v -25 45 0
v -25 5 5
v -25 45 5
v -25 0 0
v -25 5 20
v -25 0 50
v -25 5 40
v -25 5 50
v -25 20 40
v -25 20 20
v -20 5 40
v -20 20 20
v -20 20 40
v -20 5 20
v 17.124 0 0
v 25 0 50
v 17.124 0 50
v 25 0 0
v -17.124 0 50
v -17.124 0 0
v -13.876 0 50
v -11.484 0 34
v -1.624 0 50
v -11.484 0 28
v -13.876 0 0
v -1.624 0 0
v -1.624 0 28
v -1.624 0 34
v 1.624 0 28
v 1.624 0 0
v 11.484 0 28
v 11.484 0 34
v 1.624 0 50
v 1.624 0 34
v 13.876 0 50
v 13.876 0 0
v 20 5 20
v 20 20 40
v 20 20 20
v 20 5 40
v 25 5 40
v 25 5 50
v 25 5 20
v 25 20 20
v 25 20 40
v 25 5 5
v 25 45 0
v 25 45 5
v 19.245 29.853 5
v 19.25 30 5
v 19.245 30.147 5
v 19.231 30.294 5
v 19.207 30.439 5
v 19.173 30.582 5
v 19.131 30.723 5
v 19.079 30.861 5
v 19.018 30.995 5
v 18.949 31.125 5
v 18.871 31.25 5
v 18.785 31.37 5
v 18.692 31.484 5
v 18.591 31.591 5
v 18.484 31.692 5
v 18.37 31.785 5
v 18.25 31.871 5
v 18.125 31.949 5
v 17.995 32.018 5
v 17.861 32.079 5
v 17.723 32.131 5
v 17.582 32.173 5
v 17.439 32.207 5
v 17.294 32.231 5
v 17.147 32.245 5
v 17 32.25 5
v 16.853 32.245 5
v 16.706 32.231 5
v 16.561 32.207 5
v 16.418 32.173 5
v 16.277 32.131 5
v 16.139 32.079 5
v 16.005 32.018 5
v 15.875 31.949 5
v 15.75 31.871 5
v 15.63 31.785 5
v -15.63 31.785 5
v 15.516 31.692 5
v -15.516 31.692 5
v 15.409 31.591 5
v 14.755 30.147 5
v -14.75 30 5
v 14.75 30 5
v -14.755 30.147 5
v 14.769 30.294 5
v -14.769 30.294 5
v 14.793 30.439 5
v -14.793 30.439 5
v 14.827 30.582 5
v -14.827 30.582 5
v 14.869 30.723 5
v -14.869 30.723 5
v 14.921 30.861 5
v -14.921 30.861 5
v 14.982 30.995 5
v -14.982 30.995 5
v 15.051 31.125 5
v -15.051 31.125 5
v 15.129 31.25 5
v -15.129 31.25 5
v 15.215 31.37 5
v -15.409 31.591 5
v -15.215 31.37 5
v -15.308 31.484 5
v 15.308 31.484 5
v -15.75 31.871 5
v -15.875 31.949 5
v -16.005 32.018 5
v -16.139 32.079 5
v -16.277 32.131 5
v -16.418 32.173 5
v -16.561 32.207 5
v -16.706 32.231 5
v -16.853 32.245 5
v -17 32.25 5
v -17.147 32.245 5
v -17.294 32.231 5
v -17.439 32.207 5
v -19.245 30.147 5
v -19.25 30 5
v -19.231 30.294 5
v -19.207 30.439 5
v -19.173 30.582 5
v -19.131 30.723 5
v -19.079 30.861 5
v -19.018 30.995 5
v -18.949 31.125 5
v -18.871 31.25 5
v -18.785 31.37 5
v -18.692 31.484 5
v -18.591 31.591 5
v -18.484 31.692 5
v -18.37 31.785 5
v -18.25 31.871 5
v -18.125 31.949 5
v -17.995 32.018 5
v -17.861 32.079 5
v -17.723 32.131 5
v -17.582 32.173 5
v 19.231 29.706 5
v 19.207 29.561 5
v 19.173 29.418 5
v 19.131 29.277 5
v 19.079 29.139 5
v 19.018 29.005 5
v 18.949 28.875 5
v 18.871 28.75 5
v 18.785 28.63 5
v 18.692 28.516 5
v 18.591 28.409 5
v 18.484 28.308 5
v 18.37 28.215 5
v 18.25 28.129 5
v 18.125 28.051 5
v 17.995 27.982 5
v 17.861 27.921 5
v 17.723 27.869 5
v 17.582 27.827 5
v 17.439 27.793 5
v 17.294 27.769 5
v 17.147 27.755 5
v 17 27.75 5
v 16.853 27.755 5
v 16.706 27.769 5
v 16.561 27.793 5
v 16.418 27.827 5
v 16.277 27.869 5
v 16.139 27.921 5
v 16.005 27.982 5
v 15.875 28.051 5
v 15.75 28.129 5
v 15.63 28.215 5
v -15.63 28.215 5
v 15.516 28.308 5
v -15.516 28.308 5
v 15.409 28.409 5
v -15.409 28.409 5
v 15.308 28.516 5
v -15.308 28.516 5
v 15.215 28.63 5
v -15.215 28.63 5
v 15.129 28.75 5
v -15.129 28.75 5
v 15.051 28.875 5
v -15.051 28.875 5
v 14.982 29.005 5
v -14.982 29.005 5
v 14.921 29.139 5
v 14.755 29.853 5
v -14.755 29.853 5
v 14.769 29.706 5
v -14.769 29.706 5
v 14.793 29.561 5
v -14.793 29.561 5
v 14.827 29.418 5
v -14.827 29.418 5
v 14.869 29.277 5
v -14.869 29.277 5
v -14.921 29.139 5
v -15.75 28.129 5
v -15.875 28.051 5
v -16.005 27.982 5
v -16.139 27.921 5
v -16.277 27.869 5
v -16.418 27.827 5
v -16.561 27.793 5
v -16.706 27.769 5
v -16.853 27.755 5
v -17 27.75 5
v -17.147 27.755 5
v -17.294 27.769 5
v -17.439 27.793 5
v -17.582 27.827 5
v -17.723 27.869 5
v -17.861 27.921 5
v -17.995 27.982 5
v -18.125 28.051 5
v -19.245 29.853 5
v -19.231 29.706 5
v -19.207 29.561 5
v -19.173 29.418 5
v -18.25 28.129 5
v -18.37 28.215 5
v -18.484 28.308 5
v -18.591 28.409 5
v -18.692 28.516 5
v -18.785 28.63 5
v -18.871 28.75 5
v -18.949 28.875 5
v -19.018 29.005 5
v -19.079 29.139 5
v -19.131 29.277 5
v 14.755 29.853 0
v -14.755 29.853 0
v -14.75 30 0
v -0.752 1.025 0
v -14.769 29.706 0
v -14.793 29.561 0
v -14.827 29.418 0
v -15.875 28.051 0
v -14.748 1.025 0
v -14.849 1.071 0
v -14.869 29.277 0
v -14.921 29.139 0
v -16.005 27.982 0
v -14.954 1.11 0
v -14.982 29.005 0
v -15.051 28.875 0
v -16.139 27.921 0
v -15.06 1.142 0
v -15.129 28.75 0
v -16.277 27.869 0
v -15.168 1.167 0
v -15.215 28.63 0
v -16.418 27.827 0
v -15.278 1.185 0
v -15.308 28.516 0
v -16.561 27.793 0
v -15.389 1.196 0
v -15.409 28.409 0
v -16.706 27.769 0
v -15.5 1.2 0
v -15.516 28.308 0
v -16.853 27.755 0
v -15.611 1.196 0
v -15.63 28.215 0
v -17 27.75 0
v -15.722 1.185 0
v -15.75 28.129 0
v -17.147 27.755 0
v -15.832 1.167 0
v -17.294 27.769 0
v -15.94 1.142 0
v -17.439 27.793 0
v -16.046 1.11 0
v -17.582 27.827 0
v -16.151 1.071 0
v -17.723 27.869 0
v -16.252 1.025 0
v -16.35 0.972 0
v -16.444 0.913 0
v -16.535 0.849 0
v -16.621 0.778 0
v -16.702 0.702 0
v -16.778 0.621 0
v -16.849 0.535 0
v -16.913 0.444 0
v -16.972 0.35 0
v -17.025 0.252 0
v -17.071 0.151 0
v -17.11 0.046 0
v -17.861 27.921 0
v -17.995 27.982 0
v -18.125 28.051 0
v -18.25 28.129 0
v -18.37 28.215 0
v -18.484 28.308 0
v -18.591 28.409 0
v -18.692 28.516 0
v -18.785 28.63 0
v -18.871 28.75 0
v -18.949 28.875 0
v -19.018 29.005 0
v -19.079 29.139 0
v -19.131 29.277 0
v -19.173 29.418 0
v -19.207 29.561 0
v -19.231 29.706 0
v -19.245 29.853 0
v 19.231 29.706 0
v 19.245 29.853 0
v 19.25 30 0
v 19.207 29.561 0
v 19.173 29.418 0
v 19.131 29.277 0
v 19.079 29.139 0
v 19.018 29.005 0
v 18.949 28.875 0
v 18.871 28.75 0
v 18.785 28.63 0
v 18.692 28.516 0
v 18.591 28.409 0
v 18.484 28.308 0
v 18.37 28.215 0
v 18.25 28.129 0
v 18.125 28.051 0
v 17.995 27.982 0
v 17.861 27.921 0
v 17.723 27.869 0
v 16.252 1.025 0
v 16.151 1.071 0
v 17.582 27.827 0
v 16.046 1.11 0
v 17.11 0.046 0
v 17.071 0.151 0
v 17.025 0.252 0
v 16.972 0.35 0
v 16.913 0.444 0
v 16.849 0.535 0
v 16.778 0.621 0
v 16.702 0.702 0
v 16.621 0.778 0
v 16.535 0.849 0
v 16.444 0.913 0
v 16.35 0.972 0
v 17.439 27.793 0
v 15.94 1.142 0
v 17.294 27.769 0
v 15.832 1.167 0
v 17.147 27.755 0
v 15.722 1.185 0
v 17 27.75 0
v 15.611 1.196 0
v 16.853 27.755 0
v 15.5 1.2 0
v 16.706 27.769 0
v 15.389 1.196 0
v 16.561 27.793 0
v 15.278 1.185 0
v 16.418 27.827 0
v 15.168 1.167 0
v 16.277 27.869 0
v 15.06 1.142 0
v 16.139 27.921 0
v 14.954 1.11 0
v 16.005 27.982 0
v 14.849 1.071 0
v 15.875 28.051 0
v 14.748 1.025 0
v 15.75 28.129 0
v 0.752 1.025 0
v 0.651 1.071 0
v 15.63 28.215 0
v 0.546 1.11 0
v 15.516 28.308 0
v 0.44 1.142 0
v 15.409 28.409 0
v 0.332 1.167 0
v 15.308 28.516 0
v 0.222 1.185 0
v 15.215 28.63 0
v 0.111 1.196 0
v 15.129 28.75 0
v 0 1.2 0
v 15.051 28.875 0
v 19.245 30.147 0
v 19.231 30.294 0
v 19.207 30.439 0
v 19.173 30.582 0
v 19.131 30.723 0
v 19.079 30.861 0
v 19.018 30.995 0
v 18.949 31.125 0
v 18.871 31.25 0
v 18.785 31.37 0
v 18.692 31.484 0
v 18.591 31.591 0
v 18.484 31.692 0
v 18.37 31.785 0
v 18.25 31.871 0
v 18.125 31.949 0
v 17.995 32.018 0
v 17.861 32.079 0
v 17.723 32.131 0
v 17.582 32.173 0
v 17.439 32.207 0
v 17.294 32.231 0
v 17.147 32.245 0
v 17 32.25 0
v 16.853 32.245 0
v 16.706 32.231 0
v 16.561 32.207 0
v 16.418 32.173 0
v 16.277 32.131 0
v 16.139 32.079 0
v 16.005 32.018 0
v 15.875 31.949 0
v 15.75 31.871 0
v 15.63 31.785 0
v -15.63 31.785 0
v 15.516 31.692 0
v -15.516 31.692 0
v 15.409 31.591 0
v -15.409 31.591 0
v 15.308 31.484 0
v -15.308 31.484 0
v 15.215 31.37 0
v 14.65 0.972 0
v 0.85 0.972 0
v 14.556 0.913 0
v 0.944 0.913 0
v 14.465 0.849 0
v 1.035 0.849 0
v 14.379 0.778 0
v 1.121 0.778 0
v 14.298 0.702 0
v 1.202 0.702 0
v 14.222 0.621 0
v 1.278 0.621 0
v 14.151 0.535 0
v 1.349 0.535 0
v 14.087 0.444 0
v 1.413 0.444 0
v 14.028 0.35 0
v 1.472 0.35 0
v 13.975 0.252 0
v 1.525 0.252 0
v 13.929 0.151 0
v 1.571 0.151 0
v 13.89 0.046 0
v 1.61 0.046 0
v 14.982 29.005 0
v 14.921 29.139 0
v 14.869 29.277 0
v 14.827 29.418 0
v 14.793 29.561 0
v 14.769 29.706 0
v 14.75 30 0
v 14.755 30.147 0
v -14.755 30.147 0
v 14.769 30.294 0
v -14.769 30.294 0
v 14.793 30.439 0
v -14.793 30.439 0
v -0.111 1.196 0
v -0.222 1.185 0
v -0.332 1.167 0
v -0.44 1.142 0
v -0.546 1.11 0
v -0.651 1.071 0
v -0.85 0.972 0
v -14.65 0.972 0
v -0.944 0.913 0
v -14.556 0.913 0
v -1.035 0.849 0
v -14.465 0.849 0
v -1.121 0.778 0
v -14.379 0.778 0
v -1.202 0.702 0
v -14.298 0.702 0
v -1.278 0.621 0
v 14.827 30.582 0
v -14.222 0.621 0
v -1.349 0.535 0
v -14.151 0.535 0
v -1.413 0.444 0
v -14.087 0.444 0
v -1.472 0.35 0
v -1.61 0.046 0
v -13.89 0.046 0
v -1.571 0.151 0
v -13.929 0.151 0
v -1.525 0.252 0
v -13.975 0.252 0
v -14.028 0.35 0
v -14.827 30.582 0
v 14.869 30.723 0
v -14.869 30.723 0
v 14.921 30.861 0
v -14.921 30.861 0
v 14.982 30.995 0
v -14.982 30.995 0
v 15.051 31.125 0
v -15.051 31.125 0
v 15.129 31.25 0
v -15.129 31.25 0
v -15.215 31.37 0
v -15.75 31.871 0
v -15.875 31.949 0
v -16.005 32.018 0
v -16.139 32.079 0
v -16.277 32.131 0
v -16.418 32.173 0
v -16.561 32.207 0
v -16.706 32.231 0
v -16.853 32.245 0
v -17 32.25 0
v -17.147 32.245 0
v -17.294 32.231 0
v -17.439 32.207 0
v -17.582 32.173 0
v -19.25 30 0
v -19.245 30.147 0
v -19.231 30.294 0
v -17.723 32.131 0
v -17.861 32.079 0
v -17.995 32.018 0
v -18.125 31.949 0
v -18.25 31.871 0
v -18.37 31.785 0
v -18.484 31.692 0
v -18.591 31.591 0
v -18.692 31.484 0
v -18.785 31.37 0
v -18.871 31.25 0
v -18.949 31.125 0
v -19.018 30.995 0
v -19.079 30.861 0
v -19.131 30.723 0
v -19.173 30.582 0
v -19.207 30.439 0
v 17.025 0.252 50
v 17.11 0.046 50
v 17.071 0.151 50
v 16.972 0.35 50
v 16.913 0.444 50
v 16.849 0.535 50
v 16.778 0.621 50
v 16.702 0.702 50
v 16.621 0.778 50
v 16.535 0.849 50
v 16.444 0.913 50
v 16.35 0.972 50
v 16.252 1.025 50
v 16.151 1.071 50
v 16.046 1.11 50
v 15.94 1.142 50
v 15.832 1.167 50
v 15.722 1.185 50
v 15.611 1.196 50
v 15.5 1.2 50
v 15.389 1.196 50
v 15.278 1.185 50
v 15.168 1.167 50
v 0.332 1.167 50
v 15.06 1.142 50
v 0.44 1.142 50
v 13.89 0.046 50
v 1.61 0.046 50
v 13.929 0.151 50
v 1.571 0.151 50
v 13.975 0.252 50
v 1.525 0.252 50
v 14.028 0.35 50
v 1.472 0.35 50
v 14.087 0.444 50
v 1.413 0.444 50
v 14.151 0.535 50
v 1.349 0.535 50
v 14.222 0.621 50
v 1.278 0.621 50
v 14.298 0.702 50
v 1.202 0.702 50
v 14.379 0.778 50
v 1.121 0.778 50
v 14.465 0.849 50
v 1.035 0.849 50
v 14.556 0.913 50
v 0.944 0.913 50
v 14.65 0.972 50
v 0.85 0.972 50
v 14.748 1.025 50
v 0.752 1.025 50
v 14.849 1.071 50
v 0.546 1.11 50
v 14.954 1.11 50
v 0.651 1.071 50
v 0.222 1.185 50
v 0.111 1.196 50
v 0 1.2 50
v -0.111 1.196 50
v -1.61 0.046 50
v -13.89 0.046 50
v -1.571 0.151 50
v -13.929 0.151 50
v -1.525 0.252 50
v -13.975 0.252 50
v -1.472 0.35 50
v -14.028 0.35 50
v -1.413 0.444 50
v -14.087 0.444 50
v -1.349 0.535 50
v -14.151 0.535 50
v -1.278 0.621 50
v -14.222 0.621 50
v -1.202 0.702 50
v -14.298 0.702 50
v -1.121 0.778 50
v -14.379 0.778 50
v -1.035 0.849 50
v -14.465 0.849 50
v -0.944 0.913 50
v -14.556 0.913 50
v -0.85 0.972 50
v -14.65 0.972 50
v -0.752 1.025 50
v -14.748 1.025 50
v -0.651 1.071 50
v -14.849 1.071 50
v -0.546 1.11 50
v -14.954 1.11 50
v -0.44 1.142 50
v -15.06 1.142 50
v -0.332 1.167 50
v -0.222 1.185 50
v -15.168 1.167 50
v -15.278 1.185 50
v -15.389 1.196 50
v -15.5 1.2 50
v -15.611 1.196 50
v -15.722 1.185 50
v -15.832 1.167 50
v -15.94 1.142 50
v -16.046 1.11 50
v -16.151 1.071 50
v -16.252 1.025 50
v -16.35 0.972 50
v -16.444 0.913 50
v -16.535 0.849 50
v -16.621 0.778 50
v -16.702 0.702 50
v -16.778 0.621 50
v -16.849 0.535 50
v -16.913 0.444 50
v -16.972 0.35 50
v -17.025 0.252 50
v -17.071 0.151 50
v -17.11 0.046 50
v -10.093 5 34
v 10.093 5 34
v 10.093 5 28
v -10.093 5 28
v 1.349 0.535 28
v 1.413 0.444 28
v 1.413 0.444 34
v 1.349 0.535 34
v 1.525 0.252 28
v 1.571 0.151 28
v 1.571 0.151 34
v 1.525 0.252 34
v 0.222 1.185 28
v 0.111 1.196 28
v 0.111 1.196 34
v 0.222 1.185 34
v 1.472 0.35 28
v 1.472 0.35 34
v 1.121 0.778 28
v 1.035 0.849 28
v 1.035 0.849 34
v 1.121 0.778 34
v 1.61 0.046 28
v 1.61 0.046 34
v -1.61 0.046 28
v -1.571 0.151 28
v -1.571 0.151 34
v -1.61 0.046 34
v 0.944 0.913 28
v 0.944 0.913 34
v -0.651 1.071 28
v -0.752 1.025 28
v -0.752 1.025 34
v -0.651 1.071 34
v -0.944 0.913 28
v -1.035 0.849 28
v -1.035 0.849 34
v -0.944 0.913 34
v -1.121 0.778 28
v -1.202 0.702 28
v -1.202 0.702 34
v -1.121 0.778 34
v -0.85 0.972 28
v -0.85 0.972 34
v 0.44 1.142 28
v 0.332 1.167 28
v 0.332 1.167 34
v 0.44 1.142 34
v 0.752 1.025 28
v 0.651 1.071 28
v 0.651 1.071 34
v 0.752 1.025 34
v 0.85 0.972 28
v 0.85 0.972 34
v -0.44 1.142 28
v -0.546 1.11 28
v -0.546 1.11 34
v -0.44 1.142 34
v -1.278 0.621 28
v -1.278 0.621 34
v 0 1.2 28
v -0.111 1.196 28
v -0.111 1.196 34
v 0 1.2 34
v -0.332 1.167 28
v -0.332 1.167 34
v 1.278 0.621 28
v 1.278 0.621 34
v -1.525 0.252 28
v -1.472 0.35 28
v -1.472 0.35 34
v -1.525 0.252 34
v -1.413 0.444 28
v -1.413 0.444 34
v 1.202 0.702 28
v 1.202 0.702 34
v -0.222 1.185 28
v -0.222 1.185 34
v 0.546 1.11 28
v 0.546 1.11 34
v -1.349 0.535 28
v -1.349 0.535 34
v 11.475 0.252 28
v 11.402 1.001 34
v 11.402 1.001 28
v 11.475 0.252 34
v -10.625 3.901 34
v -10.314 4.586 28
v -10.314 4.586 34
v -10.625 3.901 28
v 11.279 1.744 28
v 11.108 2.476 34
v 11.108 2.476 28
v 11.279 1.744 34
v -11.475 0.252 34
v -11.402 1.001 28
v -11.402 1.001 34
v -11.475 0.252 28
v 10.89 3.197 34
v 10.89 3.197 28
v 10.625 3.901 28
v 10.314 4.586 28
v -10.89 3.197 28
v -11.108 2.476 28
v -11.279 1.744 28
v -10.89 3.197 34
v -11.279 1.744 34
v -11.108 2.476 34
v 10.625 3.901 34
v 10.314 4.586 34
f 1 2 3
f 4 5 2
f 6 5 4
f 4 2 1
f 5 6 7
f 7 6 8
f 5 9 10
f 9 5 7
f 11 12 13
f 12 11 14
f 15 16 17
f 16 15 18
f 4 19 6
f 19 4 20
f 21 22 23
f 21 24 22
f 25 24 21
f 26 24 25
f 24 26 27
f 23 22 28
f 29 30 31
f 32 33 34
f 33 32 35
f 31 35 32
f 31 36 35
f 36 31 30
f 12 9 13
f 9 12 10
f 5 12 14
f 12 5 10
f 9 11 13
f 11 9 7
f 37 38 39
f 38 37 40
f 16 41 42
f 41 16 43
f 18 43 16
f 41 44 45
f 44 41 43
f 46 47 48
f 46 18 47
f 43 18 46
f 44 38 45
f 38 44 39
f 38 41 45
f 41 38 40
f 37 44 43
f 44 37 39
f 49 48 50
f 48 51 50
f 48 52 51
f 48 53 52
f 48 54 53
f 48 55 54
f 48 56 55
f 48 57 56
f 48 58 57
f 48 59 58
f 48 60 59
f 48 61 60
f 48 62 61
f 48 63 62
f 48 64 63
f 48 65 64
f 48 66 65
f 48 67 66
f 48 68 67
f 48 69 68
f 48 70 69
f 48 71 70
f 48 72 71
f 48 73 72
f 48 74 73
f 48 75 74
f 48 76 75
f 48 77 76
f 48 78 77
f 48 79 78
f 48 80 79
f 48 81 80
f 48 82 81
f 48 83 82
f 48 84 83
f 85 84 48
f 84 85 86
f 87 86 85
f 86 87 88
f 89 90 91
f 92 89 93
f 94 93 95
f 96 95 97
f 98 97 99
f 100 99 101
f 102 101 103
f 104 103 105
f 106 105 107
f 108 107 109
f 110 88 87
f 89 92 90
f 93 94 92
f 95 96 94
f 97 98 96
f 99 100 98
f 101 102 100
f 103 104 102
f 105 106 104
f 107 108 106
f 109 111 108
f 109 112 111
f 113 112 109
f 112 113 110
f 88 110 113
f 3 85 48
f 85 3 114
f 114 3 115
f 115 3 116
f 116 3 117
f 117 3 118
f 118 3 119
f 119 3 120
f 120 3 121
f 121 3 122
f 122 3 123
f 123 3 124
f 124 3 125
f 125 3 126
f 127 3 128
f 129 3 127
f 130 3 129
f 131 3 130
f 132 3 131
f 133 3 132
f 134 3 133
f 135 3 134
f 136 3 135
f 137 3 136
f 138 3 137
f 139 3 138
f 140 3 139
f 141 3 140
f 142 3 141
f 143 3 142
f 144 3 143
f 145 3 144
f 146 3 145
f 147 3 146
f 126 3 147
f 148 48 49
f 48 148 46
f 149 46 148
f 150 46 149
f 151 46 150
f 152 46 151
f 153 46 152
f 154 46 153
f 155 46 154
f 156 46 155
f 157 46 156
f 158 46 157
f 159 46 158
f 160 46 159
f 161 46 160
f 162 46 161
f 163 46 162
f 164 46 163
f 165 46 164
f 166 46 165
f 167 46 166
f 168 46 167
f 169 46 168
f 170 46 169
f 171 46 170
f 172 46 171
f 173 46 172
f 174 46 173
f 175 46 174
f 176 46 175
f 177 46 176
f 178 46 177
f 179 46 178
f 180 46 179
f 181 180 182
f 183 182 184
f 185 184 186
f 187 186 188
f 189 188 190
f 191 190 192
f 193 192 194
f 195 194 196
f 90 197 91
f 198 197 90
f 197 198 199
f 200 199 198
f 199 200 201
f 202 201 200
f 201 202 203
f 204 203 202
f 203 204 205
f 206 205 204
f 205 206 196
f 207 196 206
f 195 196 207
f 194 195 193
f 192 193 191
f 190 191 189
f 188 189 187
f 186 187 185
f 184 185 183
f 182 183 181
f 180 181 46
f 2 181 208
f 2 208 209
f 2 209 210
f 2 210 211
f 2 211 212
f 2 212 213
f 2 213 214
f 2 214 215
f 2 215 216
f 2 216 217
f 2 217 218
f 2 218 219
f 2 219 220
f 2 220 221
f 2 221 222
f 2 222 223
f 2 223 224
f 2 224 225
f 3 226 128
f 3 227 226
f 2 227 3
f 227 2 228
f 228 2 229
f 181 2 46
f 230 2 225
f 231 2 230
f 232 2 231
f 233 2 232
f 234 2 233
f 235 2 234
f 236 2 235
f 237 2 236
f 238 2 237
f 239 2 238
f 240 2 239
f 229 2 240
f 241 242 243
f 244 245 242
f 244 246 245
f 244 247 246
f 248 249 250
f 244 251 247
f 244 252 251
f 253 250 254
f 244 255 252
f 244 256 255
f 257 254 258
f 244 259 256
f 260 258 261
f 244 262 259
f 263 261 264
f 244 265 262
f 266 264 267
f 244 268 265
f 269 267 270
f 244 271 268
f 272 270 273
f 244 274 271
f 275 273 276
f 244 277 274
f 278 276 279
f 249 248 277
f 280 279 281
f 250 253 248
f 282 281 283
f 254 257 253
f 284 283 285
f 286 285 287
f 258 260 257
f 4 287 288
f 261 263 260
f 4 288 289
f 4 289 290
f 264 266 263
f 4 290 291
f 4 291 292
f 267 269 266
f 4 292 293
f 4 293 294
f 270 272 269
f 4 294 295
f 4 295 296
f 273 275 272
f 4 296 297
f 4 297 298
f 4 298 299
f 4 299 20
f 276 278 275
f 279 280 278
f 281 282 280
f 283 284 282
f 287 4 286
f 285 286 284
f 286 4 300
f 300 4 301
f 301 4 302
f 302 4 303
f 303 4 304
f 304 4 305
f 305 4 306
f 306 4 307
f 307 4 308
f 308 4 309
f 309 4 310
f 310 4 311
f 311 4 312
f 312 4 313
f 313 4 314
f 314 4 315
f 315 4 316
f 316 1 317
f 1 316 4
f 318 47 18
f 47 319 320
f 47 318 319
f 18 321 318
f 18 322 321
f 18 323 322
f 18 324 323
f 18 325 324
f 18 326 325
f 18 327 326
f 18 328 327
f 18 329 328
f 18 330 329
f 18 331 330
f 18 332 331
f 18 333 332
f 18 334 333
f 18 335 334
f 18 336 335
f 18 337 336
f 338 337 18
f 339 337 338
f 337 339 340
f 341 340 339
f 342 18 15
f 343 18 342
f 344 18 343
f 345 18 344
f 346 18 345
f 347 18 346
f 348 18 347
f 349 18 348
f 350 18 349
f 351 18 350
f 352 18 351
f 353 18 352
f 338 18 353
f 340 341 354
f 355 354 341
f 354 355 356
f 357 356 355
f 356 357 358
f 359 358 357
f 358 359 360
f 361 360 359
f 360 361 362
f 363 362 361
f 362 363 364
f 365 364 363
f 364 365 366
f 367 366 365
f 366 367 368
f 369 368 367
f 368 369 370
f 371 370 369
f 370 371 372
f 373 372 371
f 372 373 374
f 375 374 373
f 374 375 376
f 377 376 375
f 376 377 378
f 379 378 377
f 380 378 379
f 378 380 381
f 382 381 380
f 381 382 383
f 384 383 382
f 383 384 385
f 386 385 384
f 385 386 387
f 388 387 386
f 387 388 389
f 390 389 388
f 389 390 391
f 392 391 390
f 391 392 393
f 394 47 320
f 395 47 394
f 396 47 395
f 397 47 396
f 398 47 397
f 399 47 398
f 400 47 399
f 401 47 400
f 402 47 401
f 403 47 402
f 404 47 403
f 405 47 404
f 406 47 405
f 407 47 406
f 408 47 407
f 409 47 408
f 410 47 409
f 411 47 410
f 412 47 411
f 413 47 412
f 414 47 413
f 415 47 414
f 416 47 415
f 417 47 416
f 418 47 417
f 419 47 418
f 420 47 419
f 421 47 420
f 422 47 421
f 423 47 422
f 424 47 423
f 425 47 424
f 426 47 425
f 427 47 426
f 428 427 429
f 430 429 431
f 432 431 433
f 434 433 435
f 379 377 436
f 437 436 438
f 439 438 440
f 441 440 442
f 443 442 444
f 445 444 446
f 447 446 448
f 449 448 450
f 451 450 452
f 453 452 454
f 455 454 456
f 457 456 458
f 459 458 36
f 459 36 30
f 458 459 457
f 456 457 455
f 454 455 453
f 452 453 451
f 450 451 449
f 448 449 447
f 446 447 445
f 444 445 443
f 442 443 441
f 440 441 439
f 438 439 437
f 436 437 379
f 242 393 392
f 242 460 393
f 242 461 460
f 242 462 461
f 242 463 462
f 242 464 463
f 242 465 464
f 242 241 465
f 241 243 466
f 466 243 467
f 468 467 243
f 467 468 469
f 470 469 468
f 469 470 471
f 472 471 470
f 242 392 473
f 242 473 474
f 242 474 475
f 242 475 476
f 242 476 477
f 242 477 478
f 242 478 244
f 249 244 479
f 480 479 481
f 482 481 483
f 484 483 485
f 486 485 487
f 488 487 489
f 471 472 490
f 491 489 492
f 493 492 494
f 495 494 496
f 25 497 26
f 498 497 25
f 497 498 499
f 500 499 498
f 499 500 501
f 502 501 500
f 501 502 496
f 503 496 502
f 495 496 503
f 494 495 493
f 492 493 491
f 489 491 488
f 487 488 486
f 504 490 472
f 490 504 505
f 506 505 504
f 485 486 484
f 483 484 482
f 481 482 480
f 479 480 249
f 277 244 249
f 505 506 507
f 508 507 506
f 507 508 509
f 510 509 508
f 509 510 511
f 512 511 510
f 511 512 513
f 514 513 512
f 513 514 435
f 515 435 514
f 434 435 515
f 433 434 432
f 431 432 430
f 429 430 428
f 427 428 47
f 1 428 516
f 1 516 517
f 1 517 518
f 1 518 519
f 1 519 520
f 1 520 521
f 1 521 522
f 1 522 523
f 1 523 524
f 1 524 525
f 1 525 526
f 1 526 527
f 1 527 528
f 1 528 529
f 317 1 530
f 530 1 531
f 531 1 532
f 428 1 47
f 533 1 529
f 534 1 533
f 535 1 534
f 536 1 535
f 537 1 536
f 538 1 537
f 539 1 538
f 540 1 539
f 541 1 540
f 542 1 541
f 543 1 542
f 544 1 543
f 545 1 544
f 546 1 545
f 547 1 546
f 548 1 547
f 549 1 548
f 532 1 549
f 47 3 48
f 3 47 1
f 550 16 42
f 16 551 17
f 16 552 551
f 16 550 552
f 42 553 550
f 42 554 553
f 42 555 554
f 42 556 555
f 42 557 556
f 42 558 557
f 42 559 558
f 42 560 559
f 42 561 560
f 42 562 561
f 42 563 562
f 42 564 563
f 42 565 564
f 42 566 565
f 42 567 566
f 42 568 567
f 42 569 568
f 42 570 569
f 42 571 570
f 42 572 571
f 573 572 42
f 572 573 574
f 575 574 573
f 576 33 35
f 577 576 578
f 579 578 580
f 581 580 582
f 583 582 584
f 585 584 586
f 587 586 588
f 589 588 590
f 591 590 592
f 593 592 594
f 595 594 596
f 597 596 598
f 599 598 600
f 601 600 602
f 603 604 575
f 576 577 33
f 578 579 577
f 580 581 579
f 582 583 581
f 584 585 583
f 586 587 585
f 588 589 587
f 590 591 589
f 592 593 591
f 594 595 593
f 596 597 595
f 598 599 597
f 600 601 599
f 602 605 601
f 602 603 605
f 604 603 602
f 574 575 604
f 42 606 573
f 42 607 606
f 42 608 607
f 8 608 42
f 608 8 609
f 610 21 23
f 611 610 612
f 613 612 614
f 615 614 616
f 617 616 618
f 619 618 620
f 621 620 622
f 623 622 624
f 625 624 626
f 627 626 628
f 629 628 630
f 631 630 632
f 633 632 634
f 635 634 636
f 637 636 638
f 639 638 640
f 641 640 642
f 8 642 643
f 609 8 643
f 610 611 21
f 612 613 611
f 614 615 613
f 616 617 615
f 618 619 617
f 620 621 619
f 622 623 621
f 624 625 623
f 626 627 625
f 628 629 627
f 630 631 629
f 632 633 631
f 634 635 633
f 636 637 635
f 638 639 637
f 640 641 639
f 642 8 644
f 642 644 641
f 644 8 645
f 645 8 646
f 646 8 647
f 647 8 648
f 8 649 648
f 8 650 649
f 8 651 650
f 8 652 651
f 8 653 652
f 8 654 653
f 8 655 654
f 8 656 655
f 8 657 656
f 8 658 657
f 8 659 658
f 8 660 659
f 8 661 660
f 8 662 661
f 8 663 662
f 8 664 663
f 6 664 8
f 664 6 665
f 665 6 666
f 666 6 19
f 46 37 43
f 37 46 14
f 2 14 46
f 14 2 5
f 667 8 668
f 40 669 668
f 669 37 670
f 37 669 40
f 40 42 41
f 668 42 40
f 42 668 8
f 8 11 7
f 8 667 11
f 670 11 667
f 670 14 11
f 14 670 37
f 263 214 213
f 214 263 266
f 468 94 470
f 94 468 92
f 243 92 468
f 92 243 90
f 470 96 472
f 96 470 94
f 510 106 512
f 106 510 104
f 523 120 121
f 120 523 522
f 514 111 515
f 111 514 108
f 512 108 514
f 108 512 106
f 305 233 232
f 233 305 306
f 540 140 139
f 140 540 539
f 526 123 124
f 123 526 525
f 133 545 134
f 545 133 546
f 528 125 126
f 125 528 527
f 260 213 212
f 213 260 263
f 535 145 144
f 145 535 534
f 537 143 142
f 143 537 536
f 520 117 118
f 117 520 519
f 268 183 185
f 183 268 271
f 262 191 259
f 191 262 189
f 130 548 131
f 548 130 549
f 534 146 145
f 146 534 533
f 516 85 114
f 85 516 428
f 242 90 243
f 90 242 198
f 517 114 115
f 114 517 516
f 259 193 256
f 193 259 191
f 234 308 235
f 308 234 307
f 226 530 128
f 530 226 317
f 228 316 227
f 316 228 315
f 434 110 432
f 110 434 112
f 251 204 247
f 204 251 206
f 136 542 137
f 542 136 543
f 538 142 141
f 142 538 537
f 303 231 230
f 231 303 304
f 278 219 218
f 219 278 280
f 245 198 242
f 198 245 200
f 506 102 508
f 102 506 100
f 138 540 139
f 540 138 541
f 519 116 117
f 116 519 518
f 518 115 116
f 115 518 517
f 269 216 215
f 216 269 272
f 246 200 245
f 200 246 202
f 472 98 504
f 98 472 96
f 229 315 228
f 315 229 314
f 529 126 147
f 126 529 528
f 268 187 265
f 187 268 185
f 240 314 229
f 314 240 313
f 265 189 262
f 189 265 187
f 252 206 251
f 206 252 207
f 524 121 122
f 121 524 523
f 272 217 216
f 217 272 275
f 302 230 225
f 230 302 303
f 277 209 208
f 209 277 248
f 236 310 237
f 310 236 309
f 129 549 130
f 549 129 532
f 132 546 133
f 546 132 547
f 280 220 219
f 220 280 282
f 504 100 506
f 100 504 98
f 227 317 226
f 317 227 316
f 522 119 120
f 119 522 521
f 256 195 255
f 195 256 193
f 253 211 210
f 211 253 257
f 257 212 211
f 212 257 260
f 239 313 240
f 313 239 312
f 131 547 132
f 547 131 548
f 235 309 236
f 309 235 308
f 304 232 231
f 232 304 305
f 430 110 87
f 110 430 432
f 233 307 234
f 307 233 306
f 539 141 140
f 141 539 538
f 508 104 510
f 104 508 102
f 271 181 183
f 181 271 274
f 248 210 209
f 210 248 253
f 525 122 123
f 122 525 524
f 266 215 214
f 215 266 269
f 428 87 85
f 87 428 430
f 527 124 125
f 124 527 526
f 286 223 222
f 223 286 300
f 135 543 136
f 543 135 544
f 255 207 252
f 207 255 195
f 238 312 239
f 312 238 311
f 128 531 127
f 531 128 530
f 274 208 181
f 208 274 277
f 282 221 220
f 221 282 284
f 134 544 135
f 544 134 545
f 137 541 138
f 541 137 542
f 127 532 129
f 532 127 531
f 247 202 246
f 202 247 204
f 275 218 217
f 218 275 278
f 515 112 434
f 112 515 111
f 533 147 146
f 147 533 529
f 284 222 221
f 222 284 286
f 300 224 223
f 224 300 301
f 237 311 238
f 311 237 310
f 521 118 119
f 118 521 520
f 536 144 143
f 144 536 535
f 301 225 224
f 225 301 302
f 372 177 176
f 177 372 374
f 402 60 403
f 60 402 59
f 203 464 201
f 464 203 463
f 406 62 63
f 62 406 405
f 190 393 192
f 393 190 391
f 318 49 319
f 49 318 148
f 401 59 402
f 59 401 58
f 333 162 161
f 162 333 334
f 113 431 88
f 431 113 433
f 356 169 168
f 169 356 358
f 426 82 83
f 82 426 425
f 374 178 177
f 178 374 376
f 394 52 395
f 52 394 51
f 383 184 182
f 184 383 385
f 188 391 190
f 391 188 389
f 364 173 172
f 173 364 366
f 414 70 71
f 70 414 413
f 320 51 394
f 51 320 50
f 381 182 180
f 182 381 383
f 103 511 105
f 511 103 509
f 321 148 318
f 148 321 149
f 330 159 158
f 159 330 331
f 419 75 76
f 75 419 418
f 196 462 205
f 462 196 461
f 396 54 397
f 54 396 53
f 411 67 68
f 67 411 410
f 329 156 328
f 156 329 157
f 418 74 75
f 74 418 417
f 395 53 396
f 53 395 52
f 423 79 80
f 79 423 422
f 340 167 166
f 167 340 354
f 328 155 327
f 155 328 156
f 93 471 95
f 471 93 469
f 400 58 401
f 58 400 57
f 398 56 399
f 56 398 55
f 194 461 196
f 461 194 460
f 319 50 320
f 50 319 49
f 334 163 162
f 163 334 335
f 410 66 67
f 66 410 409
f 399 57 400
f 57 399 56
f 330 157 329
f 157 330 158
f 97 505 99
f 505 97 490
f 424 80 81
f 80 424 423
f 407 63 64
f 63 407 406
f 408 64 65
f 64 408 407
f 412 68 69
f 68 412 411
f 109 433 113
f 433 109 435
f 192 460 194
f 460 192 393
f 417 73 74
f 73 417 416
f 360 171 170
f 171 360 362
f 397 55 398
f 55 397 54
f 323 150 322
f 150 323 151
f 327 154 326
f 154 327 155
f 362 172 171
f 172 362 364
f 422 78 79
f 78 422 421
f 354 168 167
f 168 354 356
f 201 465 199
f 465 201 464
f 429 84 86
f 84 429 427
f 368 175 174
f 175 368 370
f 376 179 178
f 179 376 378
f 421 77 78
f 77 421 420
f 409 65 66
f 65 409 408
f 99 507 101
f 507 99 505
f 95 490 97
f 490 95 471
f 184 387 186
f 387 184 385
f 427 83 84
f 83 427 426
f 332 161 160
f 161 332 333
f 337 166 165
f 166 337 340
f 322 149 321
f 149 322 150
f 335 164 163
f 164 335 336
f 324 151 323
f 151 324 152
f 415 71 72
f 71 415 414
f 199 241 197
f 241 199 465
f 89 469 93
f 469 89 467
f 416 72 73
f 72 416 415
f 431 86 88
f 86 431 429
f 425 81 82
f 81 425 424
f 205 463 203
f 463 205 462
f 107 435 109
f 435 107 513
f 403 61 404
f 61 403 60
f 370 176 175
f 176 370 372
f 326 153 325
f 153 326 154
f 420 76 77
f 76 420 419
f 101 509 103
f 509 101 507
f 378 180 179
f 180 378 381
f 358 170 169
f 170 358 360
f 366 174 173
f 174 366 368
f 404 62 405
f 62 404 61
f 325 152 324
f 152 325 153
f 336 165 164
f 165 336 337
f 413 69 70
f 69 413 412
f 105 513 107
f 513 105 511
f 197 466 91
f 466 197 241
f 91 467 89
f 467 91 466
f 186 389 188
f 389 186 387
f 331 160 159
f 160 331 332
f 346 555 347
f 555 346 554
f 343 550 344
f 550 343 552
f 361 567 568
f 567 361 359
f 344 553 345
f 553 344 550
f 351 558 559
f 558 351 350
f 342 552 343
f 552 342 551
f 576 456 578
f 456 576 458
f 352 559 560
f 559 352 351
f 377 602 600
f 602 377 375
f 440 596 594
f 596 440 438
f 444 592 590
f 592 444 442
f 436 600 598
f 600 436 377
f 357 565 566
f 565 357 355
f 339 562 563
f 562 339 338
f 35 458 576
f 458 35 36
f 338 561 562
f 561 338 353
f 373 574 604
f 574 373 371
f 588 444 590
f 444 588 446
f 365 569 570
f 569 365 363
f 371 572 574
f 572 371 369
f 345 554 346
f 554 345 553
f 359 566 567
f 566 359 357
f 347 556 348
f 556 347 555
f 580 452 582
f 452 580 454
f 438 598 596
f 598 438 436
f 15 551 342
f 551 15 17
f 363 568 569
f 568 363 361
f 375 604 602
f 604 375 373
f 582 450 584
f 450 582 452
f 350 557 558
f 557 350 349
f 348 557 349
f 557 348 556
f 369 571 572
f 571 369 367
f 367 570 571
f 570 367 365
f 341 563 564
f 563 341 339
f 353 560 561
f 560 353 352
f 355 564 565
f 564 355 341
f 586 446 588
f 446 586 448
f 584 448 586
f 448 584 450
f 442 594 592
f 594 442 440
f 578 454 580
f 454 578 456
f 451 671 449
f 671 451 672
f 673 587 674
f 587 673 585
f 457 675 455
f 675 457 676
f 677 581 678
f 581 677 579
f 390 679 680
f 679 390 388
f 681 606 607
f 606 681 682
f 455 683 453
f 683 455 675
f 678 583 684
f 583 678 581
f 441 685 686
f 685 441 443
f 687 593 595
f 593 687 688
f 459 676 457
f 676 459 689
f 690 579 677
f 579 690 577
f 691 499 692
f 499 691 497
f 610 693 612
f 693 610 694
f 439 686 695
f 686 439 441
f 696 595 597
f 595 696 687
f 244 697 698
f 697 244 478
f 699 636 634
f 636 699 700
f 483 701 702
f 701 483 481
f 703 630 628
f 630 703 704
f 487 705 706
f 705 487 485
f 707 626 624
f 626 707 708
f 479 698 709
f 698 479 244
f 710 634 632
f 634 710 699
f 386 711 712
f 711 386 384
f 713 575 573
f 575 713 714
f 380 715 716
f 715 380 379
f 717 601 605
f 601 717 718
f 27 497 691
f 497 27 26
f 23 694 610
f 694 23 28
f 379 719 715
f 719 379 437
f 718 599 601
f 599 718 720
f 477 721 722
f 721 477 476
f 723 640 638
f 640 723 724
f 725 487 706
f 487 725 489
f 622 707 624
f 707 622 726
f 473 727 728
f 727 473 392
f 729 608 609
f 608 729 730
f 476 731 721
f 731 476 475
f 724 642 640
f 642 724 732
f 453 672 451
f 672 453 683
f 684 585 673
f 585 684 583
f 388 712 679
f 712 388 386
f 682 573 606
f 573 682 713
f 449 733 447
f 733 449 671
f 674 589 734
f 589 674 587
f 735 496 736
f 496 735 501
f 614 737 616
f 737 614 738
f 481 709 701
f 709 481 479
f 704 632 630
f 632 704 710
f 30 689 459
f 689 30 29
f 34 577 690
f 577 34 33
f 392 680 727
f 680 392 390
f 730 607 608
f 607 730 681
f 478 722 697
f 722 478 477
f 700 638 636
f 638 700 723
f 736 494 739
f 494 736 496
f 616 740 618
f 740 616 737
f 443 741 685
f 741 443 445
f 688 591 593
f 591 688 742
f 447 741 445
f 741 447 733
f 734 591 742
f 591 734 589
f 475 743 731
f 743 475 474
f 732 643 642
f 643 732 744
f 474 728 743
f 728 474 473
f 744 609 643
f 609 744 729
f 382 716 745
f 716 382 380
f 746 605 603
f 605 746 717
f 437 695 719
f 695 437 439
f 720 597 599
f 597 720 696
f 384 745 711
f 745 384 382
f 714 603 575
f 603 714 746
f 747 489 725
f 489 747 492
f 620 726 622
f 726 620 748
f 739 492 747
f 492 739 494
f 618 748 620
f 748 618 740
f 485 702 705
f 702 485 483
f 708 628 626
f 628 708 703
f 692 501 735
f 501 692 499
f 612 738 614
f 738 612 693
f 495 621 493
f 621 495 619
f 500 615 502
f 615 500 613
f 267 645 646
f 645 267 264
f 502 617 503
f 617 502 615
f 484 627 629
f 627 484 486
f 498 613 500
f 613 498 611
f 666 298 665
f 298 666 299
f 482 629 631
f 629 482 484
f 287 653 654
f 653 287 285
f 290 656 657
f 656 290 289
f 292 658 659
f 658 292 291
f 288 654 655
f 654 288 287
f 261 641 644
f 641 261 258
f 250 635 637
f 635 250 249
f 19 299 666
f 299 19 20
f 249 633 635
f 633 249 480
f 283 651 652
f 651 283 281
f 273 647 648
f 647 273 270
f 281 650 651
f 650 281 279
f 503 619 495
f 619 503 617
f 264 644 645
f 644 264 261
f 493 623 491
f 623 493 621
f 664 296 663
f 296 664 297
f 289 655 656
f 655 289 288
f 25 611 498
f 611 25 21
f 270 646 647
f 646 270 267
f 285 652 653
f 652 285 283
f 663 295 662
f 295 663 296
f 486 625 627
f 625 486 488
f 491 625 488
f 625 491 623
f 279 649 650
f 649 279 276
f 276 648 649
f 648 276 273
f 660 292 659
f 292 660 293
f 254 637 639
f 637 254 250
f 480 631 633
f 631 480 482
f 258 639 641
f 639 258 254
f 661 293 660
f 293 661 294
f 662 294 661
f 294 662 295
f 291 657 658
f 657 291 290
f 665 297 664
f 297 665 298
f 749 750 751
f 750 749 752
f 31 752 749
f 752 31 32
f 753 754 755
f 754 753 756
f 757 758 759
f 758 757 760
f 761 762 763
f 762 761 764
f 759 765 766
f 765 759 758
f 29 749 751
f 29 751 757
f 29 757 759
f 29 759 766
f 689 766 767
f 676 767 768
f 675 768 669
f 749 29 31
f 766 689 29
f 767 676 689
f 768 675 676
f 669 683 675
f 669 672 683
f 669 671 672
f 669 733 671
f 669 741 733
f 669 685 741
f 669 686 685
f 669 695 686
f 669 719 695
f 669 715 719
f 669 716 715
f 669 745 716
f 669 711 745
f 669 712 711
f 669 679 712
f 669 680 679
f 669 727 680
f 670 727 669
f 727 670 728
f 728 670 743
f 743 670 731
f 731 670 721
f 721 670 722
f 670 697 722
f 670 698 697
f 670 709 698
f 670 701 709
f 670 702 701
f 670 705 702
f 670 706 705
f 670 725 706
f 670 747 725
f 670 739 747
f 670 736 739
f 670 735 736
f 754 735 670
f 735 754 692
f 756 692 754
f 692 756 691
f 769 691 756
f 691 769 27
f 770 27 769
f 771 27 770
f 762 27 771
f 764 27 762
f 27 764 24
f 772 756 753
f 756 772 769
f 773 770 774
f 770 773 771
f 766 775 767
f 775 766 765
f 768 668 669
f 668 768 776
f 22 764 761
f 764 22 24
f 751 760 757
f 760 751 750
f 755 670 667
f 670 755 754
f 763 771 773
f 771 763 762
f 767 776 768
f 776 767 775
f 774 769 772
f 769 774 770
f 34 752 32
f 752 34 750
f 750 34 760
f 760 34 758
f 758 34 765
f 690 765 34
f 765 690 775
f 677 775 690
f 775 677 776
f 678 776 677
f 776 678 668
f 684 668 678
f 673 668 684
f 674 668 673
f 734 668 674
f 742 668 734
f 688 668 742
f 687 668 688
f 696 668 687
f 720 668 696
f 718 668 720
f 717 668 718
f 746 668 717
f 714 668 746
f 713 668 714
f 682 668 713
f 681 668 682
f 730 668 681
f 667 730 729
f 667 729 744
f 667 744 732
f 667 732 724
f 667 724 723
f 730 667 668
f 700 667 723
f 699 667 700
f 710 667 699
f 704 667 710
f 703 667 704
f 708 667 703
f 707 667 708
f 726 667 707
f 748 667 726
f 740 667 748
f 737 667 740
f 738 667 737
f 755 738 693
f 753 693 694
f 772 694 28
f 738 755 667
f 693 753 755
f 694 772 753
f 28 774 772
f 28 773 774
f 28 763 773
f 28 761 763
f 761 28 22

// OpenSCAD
// L-shaped mounting bracket for NEMA 17 stepper motor (syringe pump)
// Print orientation: base plate on bed, motor plate building upward

$fn = 96;

// ---- Base plate ----
base_x0 = -25; base_x1 = 25;   // x span of base plate
base_y0 = 0;   base_y1 = 45;  // y span of base plate
base_z0 = 0;   base_z1 = 5;   // base plate thickness

// ---- M4 through-holes in base ----
hole_m4_x  = -17; hole_m4_y = 30;
hole_m4_x2 =  17; hole_m4_y2 = 30;
hole_d4    = 4.5;

// ---- Motor plate ----
motor_x0 = -25; motor_x1 = 25; // x span of motor plate
motor_y0 = 0;   motor_y1 = 5;  // y span (tangent to base)
motor_z0 = 0;   motor_z1 = 50; // plate thickness (z 0..50)

// ---- Boss hole ----
boss_d   = 23;   // boss hole diameter
boss_x   = 0;    // boss hole x centre
boss_z   = 28;   // boss hole z centre

// ---- M3 screw holes ----
screw_d  = 3.4;  // M3 hole diameter
screw_n  = 4;    // number of screw holes
screw_r  = 15.5; // circumradius of square pattern (31 mm side)

// ---- Gussets ----
gusset_t = 5;    // gusset thickness
gusset_a = 20;   // gusset leg along +Y
gusset_b = 20;   // gusset leg along +Z
gusset_x0 = -25; // left edge x
gusset_x1 =  25; // right edge x

// ---- Misc ----
eps = 0.5;       // cutter overshoot

difference() {
    union() {
        // Base plate
        translate([base_x0, base_y0, base_z0])
            cube([base_x1 - base_x0, base_y1 - base_y0, base_z1 - base_z0]);

        // Motor plate
        translate([motor_x0, motor_y0, motor_z0])
            cube([motor_x1 - motor_x0, motor_y1 - motor_y0, motor_z1 - motor_z0]);

        // Gussets (right triangle in YZ, flush with left/right edges)
        for (sx = [-1, 1])
            translate([sx > 0 ? gusset_x1 - gusset_t : gusset_x0,
                       gusset_a, gusset_b])
                rotate([90, 0, 0])
                    cube([gusset_t, gusset_a, gusset_b]);
    }

    // M4 holes in base
    for (i = [0, 1])
        translate([(i == 0 ? hole_m4_x : hole_m4_x2),
                   (i == 0 ? hole_m4_y : hole_m4_y2),
                   -eps])
            cylinder(d = hole_d4, h = base_z1 - base_z0 + 2 * eps);

    // Boss hole through motor plate
    translate([boss_x, -eps, boss_z])
        cylinder(d = boss_d, h = motor_y1 - motor_y0 + 2 * eps);

    // M3 screw holes
    for (j = [0 : screw_n - 1]) {
        a = screw_r * cos(j * 90);
        b = screw_r * sin(j * 90);
        translate([a, motor_y0 - eps, b])
            cylinder(d = screw_d, h = motor_z1 - motor_z0 + 2 * eps);
    }
}
